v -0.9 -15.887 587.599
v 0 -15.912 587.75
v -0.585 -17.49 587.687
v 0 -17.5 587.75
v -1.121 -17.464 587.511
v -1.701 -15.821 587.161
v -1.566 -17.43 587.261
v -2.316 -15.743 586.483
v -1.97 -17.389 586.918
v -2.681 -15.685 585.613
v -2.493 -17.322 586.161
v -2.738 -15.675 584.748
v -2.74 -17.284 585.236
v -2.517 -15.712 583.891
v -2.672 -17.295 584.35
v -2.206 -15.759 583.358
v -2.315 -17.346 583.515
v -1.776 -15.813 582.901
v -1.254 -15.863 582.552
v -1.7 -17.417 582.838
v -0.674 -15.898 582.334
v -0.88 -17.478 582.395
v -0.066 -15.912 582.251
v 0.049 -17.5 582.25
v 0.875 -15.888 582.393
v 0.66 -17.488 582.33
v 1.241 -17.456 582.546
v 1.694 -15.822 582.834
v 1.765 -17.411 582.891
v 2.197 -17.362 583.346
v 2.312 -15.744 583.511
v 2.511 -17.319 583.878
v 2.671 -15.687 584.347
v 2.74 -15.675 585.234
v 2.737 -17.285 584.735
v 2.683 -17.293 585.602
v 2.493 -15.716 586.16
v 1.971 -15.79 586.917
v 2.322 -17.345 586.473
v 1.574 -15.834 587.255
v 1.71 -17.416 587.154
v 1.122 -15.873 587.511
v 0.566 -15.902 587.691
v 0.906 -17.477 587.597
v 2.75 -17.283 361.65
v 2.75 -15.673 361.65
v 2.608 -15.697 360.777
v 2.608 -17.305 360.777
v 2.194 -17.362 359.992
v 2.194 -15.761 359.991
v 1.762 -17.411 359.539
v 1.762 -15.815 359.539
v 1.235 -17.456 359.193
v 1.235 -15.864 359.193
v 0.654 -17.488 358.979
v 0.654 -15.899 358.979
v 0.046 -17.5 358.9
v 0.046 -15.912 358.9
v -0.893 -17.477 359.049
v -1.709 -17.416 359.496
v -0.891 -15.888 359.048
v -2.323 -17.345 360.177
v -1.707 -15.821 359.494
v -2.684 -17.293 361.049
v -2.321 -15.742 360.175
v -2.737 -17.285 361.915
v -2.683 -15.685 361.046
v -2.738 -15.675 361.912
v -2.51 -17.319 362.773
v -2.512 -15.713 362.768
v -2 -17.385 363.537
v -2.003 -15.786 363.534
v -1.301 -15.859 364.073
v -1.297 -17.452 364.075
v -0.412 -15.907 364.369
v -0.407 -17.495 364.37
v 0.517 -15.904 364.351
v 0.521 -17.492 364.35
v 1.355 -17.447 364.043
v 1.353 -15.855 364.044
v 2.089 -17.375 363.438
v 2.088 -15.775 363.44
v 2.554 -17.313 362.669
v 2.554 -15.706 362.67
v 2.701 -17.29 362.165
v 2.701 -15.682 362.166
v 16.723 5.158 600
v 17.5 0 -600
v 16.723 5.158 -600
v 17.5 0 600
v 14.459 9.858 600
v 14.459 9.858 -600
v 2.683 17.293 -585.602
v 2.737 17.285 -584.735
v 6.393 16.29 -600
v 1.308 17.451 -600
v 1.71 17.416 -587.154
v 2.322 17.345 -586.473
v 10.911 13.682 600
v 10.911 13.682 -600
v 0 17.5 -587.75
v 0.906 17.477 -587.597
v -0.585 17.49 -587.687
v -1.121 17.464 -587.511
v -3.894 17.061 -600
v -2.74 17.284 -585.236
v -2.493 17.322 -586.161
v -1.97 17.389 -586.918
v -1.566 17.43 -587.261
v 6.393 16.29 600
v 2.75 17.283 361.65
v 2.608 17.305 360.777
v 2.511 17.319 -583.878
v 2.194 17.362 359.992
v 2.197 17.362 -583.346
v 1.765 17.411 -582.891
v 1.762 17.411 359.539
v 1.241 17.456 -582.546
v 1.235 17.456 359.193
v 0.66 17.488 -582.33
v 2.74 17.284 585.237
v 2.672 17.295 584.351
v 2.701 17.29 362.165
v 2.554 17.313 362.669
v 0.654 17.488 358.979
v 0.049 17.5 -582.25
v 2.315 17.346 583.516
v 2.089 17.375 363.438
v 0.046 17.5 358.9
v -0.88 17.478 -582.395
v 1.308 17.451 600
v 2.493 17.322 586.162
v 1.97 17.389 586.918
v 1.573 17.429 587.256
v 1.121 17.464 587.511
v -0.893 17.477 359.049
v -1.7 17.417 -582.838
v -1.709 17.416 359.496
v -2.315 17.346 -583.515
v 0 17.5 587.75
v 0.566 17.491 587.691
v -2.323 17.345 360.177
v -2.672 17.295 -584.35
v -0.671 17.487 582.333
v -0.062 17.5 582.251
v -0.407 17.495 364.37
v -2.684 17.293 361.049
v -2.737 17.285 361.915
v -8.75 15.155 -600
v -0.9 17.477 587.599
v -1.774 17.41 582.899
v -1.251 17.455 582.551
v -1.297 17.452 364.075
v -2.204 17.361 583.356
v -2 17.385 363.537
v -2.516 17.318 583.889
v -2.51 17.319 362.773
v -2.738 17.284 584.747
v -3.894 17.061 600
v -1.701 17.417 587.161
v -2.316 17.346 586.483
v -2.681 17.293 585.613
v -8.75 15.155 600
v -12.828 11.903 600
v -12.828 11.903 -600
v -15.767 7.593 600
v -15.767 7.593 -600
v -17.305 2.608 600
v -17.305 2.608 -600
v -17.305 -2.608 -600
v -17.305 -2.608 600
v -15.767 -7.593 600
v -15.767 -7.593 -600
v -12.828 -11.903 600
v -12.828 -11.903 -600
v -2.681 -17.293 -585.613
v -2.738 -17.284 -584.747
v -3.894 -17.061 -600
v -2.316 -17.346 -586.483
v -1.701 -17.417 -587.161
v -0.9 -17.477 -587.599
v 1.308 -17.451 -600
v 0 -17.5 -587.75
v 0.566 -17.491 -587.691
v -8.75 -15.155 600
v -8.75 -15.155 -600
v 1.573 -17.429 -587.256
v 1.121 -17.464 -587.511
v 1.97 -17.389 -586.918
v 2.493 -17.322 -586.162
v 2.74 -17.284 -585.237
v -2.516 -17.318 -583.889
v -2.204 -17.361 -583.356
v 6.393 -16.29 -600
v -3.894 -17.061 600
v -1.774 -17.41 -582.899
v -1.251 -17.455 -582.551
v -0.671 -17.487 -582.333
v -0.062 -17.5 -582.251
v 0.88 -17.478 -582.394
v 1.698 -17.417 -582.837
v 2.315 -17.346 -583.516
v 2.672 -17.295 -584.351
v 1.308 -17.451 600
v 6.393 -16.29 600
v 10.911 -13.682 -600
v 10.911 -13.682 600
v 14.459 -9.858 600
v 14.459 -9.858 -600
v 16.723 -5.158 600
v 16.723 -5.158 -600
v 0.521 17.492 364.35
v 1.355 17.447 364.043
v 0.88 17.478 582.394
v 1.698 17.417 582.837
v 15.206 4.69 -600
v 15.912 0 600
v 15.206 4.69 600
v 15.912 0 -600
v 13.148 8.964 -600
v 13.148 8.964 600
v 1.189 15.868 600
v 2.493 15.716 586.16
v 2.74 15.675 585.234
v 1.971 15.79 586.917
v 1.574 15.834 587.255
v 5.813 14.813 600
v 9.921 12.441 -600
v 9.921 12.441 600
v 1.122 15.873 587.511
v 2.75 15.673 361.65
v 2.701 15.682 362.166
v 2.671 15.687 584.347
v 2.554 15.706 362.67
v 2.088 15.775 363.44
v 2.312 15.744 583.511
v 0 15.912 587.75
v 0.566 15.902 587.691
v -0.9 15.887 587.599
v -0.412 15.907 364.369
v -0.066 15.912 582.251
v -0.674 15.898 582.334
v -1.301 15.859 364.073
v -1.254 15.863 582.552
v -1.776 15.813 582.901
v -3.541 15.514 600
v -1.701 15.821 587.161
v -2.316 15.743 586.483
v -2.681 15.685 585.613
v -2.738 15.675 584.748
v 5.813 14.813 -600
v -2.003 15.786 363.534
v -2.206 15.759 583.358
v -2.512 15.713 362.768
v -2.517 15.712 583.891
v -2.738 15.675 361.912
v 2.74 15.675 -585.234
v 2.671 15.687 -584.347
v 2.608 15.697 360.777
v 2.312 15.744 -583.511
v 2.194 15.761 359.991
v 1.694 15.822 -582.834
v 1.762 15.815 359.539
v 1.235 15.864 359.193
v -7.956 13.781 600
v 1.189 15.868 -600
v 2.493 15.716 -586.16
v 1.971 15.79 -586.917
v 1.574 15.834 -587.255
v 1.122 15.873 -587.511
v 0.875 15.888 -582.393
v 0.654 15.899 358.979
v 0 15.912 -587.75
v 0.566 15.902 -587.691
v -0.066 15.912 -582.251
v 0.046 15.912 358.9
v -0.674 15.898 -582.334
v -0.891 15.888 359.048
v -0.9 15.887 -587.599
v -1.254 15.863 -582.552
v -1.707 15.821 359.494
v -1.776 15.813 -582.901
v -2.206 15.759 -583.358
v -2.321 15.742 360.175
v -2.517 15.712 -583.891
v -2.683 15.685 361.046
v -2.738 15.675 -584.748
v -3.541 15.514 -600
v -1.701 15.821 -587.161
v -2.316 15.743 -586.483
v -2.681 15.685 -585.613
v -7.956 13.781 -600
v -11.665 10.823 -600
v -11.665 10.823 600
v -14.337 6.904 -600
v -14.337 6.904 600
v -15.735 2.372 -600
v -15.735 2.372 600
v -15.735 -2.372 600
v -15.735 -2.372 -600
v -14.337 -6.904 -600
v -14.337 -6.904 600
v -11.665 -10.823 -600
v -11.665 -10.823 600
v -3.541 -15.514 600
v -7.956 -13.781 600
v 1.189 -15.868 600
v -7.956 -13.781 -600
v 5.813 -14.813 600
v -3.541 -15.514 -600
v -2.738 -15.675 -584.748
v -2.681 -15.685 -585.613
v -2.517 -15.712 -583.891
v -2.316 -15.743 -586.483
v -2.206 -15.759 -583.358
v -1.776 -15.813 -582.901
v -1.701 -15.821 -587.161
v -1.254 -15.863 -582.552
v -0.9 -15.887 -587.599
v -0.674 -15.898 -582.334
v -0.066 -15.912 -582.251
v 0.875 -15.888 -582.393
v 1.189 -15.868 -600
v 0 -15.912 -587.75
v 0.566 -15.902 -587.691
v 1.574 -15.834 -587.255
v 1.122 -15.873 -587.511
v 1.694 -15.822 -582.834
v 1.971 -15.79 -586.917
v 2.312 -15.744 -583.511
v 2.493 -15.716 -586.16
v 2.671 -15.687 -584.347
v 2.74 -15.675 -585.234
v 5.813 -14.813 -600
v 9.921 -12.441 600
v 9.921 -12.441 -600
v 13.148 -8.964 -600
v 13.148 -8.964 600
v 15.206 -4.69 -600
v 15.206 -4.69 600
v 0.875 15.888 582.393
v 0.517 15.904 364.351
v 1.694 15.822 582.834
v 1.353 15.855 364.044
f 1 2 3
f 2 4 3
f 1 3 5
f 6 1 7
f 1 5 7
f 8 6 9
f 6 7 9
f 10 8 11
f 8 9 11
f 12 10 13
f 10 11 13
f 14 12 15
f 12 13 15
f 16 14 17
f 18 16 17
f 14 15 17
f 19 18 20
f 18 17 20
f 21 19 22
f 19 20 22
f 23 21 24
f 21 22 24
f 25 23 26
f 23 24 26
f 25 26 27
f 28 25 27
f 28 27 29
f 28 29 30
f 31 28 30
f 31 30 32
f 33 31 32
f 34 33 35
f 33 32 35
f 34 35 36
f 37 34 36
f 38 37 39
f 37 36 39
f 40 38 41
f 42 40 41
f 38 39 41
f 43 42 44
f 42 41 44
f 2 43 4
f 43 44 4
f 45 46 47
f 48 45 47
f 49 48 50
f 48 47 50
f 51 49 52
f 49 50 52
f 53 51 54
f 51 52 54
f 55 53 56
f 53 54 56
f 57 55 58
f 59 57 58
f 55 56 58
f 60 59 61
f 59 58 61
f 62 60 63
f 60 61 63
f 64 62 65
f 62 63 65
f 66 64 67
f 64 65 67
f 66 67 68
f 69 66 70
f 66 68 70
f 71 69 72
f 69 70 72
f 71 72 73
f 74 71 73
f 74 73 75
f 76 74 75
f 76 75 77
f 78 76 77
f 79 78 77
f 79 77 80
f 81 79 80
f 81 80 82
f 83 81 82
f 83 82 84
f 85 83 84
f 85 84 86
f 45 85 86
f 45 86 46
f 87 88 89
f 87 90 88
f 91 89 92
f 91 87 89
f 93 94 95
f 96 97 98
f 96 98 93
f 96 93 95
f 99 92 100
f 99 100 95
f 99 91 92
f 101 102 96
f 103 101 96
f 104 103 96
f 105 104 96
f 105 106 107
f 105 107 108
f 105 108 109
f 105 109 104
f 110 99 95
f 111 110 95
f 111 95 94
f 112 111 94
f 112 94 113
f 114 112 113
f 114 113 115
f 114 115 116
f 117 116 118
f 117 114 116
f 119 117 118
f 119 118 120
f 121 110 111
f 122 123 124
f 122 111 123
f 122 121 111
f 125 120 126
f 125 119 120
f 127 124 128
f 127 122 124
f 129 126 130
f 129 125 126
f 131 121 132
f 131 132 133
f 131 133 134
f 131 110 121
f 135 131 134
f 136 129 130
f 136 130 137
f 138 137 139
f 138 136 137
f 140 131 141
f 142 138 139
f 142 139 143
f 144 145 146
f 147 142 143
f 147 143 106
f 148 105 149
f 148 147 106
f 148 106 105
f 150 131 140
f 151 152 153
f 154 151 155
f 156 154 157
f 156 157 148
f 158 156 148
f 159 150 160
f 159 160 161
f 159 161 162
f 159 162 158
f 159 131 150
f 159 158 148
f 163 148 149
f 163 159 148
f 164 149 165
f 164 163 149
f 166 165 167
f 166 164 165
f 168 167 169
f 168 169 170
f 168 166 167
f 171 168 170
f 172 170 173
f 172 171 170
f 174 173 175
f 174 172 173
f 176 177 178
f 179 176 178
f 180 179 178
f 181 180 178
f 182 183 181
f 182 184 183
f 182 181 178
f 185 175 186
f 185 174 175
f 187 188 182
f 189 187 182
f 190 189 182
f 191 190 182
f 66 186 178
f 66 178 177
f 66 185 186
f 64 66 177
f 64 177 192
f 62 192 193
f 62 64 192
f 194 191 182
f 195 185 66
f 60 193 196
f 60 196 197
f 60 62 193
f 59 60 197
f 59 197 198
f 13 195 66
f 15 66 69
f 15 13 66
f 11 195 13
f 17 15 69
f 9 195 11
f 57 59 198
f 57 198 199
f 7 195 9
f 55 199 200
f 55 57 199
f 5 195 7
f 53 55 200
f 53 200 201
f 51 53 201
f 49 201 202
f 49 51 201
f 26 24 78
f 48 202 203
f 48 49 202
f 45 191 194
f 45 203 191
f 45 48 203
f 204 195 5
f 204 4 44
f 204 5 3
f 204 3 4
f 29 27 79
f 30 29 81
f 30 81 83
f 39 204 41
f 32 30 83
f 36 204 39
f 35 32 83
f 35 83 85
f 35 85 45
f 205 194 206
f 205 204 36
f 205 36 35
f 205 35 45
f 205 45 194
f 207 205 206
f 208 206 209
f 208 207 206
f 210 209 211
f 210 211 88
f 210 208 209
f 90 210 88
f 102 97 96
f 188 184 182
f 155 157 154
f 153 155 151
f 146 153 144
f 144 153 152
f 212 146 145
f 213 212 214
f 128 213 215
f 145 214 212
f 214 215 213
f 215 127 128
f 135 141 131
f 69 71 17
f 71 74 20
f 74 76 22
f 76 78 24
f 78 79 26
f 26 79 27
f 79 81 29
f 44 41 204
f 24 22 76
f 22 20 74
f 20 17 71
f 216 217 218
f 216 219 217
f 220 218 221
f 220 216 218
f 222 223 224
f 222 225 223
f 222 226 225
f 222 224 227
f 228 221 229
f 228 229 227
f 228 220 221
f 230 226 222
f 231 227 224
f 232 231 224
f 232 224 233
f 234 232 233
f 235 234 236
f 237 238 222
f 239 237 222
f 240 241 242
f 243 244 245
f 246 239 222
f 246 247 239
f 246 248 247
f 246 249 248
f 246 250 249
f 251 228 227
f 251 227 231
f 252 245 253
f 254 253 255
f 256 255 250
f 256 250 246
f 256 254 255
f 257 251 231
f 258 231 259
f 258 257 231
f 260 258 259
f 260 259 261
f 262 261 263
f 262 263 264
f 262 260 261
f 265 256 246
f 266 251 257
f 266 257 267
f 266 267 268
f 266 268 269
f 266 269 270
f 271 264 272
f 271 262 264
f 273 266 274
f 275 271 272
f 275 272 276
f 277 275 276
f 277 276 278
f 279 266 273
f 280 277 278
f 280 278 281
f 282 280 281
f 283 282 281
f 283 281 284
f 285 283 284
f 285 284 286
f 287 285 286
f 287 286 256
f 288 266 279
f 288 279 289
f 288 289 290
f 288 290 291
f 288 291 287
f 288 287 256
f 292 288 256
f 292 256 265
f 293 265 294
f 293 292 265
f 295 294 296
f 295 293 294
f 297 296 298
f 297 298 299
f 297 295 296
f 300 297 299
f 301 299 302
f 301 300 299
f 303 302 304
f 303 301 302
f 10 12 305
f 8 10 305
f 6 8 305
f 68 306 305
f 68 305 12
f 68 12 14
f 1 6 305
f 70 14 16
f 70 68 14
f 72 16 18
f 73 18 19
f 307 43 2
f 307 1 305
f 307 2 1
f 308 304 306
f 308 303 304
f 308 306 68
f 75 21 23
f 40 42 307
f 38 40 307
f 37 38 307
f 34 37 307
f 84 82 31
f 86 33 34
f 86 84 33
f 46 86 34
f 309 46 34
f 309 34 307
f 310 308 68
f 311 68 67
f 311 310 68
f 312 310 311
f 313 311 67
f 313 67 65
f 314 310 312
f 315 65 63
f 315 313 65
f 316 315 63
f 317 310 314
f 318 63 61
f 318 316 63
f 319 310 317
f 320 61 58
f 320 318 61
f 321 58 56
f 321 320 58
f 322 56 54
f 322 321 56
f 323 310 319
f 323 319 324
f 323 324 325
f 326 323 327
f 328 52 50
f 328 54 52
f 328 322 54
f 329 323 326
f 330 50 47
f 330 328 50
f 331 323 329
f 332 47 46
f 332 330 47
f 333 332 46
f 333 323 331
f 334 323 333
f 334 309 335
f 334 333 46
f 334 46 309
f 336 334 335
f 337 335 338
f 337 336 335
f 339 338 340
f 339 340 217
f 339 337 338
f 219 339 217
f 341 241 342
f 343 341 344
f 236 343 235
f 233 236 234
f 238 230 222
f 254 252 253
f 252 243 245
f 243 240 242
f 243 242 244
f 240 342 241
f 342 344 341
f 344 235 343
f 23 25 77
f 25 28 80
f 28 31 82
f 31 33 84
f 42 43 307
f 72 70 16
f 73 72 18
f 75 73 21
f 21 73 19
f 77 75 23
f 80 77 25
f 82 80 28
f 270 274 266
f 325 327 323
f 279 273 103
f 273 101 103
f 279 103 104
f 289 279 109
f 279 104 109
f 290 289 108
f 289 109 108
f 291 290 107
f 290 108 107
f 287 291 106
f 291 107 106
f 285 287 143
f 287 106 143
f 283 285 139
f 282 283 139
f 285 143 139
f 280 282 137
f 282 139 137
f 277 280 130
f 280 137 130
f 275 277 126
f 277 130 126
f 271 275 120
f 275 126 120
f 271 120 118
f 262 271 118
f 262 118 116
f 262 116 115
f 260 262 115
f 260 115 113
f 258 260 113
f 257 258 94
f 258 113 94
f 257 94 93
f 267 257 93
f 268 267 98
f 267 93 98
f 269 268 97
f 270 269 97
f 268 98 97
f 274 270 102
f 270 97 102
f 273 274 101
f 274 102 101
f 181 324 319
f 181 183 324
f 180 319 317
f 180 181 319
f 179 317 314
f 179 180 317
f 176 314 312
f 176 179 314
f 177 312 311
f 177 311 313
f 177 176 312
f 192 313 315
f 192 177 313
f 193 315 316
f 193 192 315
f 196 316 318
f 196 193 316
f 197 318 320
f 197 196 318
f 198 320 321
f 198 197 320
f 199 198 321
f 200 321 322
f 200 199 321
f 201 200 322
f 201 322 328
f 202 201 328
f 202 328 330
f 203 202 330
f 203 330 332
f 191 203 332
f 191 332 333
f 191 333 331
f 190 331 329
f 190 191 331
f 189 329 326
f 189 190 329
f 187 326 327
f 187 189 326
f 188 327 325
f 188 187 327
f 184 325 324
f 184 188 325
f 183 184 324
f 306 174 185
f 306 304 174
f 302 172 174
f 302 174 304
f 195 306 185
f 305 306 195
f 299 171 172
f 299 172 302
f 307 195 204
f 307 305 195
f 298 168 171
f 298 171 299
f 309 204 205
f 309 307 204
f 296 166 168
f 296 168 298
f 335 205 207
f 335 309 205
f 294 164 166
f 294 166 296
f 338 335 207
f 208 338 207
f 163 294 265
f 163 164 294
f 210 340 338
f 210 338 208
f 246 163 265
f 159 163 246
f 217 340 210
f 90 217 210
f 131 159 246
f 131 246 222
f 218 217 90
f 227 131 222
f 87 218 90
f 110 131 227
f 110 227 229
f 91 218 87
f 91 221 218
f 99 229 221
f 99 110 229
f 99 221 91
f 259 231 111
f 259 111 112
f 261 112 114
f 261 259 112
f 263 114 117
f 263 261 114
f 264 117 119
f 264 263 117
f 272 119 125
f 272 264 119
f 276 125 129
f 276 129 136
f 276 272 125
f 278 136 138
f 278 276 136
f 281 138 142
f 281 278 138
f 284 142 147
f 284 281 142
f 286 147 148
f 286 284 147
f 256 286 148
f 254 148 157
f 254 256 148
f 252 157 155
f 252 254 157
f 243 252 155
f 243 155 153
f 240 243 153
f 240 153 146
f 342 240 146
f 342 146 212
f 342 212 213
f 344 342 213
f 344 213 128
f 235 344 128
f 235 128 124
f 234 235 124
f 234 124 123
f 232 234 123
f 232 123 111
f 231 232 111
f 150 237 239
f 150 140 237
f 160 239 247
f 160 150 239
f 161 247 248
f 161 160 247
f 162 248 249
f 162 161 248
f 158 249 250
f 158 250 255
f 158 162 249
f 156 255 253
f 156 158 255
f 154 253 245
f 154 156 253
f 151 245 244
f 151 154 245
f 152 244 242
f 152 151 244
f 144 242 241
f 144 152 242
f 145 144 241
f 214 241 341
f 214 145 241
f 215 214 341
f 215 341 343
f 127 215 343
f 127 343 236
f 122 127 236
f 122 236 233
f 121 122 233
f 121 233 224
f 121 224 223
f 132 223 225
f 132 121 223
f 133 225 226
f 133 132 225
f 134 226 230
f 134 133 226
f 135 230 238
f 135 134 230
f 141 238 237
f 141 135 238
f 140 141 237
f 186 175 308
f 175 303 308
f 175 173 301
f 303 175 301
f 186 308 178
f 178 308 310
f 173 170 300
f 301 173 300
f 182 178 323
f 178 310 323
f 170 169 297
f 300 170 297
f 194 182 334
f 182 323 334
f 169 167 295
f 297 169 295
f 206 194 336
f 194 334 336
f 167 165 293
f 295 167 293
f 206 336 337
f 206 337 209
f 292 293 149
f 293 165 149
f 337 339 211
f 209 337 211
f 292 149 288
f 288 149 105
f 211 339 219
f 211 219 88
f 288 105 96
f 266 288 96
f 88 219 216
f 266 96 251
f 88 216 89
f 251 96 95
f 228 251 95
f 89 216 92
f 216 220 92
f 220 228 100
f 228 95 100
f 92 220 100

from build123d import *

# Parameters (mm, degrees)
SKETCH2_R               = 17.5
SKETCH2_R_2             = 15.9125
BOSS_EXTRUDE1_DEPTH     = 600
SKETCH5_W               = 2.75
SKETCH5_H               = 17.5
MIRROR2_COPY_1_SKETCH_W = 2.75
MIRROR2_COPY_1_SKETCH_H = 17.5
SKETCH6_R               = 2.75
CUT_EXTRUDE1_DEPTH      = 18.5000001
CUT_EXTRUDE1_DEPTH_BACK = 18.5000001


with BuildPart() as part:
    # Sketch2 → Boss-Extrude1 (new body, symmetric)
    with BuildSketch(Plane.XY):
        Circle(SKETCH2_R)
        Circle(SKETCH2_R_2, mode=Mode.SUBTRACT)
    extrude(amount=BOSS_EXTRUDE1_DEPTH, both=True)

    # Sketch5 → M5 Clearance Hole1 (revolve, cut)
    with BuildSketch(Plane(origin=(0, 0, -585), x_dir=(0, 0, -1), z_dir=(1, 0, 0))):
        with Locations((1.375, 8.75)):
            Rectangle(SKETCH5_W, SKETCH5_H)
    m5_clearance_hole1 = revolve(axis=Axis((0, -6.35, -585), (0, 1, 0)), mode=Mode.SUBTRACT)

    # Mirror1: M5 Clearance Hole1 across plane
    add(m5_clearance_hole1.mirror(Plane.ZX), mode=Mode.SUBTRACT)

    # Mirror2: M5 Clearance Hole1 across plane
    add(m5_clearance_hole1.mirror(Plane.XY), mode=Mode.SUBTRACT)

    # Mirror2 copy 1 sketch → Mirror2 copy 1 (revolve, cut)
    with BuildSketch(Plane(origin=(0, 0, 585), x_dir=(0, 0, 1), z_dir=(1, 0, 0))):
        with Locations((1.375, 8.75)):
            Rectangle(MIRROR2_COPY_1_SKETCH_W, MIRROR2_COPY_1_SKETCH_H)
    revolve(axis=Axis((0, 6.35, 585), (0, -1, 0)), mode=Mode.SUBTRACT)

    # Sketch6 → Cut-Extrude1 (cut, two sides)
    with BuildSketch(Plane(origin=(0, 0, 0), x_dir=(1, 0, 0), z_dir=(0, 1, 0))) as cut_extrude1_sk:
        with Locations((0, -361.65)):
            Circle(SKETCH6_R)
    extrude(amount=CUT_EXTRUDE1_DEPTH, mode=Mode.SUBTRACT)
    extrude(cut_extrude1_sk.sketch, amount=-CUT_EXTRUDE1_DEPTH_BACK, mode=Mode.SUBTRACT)


solid = part.part
